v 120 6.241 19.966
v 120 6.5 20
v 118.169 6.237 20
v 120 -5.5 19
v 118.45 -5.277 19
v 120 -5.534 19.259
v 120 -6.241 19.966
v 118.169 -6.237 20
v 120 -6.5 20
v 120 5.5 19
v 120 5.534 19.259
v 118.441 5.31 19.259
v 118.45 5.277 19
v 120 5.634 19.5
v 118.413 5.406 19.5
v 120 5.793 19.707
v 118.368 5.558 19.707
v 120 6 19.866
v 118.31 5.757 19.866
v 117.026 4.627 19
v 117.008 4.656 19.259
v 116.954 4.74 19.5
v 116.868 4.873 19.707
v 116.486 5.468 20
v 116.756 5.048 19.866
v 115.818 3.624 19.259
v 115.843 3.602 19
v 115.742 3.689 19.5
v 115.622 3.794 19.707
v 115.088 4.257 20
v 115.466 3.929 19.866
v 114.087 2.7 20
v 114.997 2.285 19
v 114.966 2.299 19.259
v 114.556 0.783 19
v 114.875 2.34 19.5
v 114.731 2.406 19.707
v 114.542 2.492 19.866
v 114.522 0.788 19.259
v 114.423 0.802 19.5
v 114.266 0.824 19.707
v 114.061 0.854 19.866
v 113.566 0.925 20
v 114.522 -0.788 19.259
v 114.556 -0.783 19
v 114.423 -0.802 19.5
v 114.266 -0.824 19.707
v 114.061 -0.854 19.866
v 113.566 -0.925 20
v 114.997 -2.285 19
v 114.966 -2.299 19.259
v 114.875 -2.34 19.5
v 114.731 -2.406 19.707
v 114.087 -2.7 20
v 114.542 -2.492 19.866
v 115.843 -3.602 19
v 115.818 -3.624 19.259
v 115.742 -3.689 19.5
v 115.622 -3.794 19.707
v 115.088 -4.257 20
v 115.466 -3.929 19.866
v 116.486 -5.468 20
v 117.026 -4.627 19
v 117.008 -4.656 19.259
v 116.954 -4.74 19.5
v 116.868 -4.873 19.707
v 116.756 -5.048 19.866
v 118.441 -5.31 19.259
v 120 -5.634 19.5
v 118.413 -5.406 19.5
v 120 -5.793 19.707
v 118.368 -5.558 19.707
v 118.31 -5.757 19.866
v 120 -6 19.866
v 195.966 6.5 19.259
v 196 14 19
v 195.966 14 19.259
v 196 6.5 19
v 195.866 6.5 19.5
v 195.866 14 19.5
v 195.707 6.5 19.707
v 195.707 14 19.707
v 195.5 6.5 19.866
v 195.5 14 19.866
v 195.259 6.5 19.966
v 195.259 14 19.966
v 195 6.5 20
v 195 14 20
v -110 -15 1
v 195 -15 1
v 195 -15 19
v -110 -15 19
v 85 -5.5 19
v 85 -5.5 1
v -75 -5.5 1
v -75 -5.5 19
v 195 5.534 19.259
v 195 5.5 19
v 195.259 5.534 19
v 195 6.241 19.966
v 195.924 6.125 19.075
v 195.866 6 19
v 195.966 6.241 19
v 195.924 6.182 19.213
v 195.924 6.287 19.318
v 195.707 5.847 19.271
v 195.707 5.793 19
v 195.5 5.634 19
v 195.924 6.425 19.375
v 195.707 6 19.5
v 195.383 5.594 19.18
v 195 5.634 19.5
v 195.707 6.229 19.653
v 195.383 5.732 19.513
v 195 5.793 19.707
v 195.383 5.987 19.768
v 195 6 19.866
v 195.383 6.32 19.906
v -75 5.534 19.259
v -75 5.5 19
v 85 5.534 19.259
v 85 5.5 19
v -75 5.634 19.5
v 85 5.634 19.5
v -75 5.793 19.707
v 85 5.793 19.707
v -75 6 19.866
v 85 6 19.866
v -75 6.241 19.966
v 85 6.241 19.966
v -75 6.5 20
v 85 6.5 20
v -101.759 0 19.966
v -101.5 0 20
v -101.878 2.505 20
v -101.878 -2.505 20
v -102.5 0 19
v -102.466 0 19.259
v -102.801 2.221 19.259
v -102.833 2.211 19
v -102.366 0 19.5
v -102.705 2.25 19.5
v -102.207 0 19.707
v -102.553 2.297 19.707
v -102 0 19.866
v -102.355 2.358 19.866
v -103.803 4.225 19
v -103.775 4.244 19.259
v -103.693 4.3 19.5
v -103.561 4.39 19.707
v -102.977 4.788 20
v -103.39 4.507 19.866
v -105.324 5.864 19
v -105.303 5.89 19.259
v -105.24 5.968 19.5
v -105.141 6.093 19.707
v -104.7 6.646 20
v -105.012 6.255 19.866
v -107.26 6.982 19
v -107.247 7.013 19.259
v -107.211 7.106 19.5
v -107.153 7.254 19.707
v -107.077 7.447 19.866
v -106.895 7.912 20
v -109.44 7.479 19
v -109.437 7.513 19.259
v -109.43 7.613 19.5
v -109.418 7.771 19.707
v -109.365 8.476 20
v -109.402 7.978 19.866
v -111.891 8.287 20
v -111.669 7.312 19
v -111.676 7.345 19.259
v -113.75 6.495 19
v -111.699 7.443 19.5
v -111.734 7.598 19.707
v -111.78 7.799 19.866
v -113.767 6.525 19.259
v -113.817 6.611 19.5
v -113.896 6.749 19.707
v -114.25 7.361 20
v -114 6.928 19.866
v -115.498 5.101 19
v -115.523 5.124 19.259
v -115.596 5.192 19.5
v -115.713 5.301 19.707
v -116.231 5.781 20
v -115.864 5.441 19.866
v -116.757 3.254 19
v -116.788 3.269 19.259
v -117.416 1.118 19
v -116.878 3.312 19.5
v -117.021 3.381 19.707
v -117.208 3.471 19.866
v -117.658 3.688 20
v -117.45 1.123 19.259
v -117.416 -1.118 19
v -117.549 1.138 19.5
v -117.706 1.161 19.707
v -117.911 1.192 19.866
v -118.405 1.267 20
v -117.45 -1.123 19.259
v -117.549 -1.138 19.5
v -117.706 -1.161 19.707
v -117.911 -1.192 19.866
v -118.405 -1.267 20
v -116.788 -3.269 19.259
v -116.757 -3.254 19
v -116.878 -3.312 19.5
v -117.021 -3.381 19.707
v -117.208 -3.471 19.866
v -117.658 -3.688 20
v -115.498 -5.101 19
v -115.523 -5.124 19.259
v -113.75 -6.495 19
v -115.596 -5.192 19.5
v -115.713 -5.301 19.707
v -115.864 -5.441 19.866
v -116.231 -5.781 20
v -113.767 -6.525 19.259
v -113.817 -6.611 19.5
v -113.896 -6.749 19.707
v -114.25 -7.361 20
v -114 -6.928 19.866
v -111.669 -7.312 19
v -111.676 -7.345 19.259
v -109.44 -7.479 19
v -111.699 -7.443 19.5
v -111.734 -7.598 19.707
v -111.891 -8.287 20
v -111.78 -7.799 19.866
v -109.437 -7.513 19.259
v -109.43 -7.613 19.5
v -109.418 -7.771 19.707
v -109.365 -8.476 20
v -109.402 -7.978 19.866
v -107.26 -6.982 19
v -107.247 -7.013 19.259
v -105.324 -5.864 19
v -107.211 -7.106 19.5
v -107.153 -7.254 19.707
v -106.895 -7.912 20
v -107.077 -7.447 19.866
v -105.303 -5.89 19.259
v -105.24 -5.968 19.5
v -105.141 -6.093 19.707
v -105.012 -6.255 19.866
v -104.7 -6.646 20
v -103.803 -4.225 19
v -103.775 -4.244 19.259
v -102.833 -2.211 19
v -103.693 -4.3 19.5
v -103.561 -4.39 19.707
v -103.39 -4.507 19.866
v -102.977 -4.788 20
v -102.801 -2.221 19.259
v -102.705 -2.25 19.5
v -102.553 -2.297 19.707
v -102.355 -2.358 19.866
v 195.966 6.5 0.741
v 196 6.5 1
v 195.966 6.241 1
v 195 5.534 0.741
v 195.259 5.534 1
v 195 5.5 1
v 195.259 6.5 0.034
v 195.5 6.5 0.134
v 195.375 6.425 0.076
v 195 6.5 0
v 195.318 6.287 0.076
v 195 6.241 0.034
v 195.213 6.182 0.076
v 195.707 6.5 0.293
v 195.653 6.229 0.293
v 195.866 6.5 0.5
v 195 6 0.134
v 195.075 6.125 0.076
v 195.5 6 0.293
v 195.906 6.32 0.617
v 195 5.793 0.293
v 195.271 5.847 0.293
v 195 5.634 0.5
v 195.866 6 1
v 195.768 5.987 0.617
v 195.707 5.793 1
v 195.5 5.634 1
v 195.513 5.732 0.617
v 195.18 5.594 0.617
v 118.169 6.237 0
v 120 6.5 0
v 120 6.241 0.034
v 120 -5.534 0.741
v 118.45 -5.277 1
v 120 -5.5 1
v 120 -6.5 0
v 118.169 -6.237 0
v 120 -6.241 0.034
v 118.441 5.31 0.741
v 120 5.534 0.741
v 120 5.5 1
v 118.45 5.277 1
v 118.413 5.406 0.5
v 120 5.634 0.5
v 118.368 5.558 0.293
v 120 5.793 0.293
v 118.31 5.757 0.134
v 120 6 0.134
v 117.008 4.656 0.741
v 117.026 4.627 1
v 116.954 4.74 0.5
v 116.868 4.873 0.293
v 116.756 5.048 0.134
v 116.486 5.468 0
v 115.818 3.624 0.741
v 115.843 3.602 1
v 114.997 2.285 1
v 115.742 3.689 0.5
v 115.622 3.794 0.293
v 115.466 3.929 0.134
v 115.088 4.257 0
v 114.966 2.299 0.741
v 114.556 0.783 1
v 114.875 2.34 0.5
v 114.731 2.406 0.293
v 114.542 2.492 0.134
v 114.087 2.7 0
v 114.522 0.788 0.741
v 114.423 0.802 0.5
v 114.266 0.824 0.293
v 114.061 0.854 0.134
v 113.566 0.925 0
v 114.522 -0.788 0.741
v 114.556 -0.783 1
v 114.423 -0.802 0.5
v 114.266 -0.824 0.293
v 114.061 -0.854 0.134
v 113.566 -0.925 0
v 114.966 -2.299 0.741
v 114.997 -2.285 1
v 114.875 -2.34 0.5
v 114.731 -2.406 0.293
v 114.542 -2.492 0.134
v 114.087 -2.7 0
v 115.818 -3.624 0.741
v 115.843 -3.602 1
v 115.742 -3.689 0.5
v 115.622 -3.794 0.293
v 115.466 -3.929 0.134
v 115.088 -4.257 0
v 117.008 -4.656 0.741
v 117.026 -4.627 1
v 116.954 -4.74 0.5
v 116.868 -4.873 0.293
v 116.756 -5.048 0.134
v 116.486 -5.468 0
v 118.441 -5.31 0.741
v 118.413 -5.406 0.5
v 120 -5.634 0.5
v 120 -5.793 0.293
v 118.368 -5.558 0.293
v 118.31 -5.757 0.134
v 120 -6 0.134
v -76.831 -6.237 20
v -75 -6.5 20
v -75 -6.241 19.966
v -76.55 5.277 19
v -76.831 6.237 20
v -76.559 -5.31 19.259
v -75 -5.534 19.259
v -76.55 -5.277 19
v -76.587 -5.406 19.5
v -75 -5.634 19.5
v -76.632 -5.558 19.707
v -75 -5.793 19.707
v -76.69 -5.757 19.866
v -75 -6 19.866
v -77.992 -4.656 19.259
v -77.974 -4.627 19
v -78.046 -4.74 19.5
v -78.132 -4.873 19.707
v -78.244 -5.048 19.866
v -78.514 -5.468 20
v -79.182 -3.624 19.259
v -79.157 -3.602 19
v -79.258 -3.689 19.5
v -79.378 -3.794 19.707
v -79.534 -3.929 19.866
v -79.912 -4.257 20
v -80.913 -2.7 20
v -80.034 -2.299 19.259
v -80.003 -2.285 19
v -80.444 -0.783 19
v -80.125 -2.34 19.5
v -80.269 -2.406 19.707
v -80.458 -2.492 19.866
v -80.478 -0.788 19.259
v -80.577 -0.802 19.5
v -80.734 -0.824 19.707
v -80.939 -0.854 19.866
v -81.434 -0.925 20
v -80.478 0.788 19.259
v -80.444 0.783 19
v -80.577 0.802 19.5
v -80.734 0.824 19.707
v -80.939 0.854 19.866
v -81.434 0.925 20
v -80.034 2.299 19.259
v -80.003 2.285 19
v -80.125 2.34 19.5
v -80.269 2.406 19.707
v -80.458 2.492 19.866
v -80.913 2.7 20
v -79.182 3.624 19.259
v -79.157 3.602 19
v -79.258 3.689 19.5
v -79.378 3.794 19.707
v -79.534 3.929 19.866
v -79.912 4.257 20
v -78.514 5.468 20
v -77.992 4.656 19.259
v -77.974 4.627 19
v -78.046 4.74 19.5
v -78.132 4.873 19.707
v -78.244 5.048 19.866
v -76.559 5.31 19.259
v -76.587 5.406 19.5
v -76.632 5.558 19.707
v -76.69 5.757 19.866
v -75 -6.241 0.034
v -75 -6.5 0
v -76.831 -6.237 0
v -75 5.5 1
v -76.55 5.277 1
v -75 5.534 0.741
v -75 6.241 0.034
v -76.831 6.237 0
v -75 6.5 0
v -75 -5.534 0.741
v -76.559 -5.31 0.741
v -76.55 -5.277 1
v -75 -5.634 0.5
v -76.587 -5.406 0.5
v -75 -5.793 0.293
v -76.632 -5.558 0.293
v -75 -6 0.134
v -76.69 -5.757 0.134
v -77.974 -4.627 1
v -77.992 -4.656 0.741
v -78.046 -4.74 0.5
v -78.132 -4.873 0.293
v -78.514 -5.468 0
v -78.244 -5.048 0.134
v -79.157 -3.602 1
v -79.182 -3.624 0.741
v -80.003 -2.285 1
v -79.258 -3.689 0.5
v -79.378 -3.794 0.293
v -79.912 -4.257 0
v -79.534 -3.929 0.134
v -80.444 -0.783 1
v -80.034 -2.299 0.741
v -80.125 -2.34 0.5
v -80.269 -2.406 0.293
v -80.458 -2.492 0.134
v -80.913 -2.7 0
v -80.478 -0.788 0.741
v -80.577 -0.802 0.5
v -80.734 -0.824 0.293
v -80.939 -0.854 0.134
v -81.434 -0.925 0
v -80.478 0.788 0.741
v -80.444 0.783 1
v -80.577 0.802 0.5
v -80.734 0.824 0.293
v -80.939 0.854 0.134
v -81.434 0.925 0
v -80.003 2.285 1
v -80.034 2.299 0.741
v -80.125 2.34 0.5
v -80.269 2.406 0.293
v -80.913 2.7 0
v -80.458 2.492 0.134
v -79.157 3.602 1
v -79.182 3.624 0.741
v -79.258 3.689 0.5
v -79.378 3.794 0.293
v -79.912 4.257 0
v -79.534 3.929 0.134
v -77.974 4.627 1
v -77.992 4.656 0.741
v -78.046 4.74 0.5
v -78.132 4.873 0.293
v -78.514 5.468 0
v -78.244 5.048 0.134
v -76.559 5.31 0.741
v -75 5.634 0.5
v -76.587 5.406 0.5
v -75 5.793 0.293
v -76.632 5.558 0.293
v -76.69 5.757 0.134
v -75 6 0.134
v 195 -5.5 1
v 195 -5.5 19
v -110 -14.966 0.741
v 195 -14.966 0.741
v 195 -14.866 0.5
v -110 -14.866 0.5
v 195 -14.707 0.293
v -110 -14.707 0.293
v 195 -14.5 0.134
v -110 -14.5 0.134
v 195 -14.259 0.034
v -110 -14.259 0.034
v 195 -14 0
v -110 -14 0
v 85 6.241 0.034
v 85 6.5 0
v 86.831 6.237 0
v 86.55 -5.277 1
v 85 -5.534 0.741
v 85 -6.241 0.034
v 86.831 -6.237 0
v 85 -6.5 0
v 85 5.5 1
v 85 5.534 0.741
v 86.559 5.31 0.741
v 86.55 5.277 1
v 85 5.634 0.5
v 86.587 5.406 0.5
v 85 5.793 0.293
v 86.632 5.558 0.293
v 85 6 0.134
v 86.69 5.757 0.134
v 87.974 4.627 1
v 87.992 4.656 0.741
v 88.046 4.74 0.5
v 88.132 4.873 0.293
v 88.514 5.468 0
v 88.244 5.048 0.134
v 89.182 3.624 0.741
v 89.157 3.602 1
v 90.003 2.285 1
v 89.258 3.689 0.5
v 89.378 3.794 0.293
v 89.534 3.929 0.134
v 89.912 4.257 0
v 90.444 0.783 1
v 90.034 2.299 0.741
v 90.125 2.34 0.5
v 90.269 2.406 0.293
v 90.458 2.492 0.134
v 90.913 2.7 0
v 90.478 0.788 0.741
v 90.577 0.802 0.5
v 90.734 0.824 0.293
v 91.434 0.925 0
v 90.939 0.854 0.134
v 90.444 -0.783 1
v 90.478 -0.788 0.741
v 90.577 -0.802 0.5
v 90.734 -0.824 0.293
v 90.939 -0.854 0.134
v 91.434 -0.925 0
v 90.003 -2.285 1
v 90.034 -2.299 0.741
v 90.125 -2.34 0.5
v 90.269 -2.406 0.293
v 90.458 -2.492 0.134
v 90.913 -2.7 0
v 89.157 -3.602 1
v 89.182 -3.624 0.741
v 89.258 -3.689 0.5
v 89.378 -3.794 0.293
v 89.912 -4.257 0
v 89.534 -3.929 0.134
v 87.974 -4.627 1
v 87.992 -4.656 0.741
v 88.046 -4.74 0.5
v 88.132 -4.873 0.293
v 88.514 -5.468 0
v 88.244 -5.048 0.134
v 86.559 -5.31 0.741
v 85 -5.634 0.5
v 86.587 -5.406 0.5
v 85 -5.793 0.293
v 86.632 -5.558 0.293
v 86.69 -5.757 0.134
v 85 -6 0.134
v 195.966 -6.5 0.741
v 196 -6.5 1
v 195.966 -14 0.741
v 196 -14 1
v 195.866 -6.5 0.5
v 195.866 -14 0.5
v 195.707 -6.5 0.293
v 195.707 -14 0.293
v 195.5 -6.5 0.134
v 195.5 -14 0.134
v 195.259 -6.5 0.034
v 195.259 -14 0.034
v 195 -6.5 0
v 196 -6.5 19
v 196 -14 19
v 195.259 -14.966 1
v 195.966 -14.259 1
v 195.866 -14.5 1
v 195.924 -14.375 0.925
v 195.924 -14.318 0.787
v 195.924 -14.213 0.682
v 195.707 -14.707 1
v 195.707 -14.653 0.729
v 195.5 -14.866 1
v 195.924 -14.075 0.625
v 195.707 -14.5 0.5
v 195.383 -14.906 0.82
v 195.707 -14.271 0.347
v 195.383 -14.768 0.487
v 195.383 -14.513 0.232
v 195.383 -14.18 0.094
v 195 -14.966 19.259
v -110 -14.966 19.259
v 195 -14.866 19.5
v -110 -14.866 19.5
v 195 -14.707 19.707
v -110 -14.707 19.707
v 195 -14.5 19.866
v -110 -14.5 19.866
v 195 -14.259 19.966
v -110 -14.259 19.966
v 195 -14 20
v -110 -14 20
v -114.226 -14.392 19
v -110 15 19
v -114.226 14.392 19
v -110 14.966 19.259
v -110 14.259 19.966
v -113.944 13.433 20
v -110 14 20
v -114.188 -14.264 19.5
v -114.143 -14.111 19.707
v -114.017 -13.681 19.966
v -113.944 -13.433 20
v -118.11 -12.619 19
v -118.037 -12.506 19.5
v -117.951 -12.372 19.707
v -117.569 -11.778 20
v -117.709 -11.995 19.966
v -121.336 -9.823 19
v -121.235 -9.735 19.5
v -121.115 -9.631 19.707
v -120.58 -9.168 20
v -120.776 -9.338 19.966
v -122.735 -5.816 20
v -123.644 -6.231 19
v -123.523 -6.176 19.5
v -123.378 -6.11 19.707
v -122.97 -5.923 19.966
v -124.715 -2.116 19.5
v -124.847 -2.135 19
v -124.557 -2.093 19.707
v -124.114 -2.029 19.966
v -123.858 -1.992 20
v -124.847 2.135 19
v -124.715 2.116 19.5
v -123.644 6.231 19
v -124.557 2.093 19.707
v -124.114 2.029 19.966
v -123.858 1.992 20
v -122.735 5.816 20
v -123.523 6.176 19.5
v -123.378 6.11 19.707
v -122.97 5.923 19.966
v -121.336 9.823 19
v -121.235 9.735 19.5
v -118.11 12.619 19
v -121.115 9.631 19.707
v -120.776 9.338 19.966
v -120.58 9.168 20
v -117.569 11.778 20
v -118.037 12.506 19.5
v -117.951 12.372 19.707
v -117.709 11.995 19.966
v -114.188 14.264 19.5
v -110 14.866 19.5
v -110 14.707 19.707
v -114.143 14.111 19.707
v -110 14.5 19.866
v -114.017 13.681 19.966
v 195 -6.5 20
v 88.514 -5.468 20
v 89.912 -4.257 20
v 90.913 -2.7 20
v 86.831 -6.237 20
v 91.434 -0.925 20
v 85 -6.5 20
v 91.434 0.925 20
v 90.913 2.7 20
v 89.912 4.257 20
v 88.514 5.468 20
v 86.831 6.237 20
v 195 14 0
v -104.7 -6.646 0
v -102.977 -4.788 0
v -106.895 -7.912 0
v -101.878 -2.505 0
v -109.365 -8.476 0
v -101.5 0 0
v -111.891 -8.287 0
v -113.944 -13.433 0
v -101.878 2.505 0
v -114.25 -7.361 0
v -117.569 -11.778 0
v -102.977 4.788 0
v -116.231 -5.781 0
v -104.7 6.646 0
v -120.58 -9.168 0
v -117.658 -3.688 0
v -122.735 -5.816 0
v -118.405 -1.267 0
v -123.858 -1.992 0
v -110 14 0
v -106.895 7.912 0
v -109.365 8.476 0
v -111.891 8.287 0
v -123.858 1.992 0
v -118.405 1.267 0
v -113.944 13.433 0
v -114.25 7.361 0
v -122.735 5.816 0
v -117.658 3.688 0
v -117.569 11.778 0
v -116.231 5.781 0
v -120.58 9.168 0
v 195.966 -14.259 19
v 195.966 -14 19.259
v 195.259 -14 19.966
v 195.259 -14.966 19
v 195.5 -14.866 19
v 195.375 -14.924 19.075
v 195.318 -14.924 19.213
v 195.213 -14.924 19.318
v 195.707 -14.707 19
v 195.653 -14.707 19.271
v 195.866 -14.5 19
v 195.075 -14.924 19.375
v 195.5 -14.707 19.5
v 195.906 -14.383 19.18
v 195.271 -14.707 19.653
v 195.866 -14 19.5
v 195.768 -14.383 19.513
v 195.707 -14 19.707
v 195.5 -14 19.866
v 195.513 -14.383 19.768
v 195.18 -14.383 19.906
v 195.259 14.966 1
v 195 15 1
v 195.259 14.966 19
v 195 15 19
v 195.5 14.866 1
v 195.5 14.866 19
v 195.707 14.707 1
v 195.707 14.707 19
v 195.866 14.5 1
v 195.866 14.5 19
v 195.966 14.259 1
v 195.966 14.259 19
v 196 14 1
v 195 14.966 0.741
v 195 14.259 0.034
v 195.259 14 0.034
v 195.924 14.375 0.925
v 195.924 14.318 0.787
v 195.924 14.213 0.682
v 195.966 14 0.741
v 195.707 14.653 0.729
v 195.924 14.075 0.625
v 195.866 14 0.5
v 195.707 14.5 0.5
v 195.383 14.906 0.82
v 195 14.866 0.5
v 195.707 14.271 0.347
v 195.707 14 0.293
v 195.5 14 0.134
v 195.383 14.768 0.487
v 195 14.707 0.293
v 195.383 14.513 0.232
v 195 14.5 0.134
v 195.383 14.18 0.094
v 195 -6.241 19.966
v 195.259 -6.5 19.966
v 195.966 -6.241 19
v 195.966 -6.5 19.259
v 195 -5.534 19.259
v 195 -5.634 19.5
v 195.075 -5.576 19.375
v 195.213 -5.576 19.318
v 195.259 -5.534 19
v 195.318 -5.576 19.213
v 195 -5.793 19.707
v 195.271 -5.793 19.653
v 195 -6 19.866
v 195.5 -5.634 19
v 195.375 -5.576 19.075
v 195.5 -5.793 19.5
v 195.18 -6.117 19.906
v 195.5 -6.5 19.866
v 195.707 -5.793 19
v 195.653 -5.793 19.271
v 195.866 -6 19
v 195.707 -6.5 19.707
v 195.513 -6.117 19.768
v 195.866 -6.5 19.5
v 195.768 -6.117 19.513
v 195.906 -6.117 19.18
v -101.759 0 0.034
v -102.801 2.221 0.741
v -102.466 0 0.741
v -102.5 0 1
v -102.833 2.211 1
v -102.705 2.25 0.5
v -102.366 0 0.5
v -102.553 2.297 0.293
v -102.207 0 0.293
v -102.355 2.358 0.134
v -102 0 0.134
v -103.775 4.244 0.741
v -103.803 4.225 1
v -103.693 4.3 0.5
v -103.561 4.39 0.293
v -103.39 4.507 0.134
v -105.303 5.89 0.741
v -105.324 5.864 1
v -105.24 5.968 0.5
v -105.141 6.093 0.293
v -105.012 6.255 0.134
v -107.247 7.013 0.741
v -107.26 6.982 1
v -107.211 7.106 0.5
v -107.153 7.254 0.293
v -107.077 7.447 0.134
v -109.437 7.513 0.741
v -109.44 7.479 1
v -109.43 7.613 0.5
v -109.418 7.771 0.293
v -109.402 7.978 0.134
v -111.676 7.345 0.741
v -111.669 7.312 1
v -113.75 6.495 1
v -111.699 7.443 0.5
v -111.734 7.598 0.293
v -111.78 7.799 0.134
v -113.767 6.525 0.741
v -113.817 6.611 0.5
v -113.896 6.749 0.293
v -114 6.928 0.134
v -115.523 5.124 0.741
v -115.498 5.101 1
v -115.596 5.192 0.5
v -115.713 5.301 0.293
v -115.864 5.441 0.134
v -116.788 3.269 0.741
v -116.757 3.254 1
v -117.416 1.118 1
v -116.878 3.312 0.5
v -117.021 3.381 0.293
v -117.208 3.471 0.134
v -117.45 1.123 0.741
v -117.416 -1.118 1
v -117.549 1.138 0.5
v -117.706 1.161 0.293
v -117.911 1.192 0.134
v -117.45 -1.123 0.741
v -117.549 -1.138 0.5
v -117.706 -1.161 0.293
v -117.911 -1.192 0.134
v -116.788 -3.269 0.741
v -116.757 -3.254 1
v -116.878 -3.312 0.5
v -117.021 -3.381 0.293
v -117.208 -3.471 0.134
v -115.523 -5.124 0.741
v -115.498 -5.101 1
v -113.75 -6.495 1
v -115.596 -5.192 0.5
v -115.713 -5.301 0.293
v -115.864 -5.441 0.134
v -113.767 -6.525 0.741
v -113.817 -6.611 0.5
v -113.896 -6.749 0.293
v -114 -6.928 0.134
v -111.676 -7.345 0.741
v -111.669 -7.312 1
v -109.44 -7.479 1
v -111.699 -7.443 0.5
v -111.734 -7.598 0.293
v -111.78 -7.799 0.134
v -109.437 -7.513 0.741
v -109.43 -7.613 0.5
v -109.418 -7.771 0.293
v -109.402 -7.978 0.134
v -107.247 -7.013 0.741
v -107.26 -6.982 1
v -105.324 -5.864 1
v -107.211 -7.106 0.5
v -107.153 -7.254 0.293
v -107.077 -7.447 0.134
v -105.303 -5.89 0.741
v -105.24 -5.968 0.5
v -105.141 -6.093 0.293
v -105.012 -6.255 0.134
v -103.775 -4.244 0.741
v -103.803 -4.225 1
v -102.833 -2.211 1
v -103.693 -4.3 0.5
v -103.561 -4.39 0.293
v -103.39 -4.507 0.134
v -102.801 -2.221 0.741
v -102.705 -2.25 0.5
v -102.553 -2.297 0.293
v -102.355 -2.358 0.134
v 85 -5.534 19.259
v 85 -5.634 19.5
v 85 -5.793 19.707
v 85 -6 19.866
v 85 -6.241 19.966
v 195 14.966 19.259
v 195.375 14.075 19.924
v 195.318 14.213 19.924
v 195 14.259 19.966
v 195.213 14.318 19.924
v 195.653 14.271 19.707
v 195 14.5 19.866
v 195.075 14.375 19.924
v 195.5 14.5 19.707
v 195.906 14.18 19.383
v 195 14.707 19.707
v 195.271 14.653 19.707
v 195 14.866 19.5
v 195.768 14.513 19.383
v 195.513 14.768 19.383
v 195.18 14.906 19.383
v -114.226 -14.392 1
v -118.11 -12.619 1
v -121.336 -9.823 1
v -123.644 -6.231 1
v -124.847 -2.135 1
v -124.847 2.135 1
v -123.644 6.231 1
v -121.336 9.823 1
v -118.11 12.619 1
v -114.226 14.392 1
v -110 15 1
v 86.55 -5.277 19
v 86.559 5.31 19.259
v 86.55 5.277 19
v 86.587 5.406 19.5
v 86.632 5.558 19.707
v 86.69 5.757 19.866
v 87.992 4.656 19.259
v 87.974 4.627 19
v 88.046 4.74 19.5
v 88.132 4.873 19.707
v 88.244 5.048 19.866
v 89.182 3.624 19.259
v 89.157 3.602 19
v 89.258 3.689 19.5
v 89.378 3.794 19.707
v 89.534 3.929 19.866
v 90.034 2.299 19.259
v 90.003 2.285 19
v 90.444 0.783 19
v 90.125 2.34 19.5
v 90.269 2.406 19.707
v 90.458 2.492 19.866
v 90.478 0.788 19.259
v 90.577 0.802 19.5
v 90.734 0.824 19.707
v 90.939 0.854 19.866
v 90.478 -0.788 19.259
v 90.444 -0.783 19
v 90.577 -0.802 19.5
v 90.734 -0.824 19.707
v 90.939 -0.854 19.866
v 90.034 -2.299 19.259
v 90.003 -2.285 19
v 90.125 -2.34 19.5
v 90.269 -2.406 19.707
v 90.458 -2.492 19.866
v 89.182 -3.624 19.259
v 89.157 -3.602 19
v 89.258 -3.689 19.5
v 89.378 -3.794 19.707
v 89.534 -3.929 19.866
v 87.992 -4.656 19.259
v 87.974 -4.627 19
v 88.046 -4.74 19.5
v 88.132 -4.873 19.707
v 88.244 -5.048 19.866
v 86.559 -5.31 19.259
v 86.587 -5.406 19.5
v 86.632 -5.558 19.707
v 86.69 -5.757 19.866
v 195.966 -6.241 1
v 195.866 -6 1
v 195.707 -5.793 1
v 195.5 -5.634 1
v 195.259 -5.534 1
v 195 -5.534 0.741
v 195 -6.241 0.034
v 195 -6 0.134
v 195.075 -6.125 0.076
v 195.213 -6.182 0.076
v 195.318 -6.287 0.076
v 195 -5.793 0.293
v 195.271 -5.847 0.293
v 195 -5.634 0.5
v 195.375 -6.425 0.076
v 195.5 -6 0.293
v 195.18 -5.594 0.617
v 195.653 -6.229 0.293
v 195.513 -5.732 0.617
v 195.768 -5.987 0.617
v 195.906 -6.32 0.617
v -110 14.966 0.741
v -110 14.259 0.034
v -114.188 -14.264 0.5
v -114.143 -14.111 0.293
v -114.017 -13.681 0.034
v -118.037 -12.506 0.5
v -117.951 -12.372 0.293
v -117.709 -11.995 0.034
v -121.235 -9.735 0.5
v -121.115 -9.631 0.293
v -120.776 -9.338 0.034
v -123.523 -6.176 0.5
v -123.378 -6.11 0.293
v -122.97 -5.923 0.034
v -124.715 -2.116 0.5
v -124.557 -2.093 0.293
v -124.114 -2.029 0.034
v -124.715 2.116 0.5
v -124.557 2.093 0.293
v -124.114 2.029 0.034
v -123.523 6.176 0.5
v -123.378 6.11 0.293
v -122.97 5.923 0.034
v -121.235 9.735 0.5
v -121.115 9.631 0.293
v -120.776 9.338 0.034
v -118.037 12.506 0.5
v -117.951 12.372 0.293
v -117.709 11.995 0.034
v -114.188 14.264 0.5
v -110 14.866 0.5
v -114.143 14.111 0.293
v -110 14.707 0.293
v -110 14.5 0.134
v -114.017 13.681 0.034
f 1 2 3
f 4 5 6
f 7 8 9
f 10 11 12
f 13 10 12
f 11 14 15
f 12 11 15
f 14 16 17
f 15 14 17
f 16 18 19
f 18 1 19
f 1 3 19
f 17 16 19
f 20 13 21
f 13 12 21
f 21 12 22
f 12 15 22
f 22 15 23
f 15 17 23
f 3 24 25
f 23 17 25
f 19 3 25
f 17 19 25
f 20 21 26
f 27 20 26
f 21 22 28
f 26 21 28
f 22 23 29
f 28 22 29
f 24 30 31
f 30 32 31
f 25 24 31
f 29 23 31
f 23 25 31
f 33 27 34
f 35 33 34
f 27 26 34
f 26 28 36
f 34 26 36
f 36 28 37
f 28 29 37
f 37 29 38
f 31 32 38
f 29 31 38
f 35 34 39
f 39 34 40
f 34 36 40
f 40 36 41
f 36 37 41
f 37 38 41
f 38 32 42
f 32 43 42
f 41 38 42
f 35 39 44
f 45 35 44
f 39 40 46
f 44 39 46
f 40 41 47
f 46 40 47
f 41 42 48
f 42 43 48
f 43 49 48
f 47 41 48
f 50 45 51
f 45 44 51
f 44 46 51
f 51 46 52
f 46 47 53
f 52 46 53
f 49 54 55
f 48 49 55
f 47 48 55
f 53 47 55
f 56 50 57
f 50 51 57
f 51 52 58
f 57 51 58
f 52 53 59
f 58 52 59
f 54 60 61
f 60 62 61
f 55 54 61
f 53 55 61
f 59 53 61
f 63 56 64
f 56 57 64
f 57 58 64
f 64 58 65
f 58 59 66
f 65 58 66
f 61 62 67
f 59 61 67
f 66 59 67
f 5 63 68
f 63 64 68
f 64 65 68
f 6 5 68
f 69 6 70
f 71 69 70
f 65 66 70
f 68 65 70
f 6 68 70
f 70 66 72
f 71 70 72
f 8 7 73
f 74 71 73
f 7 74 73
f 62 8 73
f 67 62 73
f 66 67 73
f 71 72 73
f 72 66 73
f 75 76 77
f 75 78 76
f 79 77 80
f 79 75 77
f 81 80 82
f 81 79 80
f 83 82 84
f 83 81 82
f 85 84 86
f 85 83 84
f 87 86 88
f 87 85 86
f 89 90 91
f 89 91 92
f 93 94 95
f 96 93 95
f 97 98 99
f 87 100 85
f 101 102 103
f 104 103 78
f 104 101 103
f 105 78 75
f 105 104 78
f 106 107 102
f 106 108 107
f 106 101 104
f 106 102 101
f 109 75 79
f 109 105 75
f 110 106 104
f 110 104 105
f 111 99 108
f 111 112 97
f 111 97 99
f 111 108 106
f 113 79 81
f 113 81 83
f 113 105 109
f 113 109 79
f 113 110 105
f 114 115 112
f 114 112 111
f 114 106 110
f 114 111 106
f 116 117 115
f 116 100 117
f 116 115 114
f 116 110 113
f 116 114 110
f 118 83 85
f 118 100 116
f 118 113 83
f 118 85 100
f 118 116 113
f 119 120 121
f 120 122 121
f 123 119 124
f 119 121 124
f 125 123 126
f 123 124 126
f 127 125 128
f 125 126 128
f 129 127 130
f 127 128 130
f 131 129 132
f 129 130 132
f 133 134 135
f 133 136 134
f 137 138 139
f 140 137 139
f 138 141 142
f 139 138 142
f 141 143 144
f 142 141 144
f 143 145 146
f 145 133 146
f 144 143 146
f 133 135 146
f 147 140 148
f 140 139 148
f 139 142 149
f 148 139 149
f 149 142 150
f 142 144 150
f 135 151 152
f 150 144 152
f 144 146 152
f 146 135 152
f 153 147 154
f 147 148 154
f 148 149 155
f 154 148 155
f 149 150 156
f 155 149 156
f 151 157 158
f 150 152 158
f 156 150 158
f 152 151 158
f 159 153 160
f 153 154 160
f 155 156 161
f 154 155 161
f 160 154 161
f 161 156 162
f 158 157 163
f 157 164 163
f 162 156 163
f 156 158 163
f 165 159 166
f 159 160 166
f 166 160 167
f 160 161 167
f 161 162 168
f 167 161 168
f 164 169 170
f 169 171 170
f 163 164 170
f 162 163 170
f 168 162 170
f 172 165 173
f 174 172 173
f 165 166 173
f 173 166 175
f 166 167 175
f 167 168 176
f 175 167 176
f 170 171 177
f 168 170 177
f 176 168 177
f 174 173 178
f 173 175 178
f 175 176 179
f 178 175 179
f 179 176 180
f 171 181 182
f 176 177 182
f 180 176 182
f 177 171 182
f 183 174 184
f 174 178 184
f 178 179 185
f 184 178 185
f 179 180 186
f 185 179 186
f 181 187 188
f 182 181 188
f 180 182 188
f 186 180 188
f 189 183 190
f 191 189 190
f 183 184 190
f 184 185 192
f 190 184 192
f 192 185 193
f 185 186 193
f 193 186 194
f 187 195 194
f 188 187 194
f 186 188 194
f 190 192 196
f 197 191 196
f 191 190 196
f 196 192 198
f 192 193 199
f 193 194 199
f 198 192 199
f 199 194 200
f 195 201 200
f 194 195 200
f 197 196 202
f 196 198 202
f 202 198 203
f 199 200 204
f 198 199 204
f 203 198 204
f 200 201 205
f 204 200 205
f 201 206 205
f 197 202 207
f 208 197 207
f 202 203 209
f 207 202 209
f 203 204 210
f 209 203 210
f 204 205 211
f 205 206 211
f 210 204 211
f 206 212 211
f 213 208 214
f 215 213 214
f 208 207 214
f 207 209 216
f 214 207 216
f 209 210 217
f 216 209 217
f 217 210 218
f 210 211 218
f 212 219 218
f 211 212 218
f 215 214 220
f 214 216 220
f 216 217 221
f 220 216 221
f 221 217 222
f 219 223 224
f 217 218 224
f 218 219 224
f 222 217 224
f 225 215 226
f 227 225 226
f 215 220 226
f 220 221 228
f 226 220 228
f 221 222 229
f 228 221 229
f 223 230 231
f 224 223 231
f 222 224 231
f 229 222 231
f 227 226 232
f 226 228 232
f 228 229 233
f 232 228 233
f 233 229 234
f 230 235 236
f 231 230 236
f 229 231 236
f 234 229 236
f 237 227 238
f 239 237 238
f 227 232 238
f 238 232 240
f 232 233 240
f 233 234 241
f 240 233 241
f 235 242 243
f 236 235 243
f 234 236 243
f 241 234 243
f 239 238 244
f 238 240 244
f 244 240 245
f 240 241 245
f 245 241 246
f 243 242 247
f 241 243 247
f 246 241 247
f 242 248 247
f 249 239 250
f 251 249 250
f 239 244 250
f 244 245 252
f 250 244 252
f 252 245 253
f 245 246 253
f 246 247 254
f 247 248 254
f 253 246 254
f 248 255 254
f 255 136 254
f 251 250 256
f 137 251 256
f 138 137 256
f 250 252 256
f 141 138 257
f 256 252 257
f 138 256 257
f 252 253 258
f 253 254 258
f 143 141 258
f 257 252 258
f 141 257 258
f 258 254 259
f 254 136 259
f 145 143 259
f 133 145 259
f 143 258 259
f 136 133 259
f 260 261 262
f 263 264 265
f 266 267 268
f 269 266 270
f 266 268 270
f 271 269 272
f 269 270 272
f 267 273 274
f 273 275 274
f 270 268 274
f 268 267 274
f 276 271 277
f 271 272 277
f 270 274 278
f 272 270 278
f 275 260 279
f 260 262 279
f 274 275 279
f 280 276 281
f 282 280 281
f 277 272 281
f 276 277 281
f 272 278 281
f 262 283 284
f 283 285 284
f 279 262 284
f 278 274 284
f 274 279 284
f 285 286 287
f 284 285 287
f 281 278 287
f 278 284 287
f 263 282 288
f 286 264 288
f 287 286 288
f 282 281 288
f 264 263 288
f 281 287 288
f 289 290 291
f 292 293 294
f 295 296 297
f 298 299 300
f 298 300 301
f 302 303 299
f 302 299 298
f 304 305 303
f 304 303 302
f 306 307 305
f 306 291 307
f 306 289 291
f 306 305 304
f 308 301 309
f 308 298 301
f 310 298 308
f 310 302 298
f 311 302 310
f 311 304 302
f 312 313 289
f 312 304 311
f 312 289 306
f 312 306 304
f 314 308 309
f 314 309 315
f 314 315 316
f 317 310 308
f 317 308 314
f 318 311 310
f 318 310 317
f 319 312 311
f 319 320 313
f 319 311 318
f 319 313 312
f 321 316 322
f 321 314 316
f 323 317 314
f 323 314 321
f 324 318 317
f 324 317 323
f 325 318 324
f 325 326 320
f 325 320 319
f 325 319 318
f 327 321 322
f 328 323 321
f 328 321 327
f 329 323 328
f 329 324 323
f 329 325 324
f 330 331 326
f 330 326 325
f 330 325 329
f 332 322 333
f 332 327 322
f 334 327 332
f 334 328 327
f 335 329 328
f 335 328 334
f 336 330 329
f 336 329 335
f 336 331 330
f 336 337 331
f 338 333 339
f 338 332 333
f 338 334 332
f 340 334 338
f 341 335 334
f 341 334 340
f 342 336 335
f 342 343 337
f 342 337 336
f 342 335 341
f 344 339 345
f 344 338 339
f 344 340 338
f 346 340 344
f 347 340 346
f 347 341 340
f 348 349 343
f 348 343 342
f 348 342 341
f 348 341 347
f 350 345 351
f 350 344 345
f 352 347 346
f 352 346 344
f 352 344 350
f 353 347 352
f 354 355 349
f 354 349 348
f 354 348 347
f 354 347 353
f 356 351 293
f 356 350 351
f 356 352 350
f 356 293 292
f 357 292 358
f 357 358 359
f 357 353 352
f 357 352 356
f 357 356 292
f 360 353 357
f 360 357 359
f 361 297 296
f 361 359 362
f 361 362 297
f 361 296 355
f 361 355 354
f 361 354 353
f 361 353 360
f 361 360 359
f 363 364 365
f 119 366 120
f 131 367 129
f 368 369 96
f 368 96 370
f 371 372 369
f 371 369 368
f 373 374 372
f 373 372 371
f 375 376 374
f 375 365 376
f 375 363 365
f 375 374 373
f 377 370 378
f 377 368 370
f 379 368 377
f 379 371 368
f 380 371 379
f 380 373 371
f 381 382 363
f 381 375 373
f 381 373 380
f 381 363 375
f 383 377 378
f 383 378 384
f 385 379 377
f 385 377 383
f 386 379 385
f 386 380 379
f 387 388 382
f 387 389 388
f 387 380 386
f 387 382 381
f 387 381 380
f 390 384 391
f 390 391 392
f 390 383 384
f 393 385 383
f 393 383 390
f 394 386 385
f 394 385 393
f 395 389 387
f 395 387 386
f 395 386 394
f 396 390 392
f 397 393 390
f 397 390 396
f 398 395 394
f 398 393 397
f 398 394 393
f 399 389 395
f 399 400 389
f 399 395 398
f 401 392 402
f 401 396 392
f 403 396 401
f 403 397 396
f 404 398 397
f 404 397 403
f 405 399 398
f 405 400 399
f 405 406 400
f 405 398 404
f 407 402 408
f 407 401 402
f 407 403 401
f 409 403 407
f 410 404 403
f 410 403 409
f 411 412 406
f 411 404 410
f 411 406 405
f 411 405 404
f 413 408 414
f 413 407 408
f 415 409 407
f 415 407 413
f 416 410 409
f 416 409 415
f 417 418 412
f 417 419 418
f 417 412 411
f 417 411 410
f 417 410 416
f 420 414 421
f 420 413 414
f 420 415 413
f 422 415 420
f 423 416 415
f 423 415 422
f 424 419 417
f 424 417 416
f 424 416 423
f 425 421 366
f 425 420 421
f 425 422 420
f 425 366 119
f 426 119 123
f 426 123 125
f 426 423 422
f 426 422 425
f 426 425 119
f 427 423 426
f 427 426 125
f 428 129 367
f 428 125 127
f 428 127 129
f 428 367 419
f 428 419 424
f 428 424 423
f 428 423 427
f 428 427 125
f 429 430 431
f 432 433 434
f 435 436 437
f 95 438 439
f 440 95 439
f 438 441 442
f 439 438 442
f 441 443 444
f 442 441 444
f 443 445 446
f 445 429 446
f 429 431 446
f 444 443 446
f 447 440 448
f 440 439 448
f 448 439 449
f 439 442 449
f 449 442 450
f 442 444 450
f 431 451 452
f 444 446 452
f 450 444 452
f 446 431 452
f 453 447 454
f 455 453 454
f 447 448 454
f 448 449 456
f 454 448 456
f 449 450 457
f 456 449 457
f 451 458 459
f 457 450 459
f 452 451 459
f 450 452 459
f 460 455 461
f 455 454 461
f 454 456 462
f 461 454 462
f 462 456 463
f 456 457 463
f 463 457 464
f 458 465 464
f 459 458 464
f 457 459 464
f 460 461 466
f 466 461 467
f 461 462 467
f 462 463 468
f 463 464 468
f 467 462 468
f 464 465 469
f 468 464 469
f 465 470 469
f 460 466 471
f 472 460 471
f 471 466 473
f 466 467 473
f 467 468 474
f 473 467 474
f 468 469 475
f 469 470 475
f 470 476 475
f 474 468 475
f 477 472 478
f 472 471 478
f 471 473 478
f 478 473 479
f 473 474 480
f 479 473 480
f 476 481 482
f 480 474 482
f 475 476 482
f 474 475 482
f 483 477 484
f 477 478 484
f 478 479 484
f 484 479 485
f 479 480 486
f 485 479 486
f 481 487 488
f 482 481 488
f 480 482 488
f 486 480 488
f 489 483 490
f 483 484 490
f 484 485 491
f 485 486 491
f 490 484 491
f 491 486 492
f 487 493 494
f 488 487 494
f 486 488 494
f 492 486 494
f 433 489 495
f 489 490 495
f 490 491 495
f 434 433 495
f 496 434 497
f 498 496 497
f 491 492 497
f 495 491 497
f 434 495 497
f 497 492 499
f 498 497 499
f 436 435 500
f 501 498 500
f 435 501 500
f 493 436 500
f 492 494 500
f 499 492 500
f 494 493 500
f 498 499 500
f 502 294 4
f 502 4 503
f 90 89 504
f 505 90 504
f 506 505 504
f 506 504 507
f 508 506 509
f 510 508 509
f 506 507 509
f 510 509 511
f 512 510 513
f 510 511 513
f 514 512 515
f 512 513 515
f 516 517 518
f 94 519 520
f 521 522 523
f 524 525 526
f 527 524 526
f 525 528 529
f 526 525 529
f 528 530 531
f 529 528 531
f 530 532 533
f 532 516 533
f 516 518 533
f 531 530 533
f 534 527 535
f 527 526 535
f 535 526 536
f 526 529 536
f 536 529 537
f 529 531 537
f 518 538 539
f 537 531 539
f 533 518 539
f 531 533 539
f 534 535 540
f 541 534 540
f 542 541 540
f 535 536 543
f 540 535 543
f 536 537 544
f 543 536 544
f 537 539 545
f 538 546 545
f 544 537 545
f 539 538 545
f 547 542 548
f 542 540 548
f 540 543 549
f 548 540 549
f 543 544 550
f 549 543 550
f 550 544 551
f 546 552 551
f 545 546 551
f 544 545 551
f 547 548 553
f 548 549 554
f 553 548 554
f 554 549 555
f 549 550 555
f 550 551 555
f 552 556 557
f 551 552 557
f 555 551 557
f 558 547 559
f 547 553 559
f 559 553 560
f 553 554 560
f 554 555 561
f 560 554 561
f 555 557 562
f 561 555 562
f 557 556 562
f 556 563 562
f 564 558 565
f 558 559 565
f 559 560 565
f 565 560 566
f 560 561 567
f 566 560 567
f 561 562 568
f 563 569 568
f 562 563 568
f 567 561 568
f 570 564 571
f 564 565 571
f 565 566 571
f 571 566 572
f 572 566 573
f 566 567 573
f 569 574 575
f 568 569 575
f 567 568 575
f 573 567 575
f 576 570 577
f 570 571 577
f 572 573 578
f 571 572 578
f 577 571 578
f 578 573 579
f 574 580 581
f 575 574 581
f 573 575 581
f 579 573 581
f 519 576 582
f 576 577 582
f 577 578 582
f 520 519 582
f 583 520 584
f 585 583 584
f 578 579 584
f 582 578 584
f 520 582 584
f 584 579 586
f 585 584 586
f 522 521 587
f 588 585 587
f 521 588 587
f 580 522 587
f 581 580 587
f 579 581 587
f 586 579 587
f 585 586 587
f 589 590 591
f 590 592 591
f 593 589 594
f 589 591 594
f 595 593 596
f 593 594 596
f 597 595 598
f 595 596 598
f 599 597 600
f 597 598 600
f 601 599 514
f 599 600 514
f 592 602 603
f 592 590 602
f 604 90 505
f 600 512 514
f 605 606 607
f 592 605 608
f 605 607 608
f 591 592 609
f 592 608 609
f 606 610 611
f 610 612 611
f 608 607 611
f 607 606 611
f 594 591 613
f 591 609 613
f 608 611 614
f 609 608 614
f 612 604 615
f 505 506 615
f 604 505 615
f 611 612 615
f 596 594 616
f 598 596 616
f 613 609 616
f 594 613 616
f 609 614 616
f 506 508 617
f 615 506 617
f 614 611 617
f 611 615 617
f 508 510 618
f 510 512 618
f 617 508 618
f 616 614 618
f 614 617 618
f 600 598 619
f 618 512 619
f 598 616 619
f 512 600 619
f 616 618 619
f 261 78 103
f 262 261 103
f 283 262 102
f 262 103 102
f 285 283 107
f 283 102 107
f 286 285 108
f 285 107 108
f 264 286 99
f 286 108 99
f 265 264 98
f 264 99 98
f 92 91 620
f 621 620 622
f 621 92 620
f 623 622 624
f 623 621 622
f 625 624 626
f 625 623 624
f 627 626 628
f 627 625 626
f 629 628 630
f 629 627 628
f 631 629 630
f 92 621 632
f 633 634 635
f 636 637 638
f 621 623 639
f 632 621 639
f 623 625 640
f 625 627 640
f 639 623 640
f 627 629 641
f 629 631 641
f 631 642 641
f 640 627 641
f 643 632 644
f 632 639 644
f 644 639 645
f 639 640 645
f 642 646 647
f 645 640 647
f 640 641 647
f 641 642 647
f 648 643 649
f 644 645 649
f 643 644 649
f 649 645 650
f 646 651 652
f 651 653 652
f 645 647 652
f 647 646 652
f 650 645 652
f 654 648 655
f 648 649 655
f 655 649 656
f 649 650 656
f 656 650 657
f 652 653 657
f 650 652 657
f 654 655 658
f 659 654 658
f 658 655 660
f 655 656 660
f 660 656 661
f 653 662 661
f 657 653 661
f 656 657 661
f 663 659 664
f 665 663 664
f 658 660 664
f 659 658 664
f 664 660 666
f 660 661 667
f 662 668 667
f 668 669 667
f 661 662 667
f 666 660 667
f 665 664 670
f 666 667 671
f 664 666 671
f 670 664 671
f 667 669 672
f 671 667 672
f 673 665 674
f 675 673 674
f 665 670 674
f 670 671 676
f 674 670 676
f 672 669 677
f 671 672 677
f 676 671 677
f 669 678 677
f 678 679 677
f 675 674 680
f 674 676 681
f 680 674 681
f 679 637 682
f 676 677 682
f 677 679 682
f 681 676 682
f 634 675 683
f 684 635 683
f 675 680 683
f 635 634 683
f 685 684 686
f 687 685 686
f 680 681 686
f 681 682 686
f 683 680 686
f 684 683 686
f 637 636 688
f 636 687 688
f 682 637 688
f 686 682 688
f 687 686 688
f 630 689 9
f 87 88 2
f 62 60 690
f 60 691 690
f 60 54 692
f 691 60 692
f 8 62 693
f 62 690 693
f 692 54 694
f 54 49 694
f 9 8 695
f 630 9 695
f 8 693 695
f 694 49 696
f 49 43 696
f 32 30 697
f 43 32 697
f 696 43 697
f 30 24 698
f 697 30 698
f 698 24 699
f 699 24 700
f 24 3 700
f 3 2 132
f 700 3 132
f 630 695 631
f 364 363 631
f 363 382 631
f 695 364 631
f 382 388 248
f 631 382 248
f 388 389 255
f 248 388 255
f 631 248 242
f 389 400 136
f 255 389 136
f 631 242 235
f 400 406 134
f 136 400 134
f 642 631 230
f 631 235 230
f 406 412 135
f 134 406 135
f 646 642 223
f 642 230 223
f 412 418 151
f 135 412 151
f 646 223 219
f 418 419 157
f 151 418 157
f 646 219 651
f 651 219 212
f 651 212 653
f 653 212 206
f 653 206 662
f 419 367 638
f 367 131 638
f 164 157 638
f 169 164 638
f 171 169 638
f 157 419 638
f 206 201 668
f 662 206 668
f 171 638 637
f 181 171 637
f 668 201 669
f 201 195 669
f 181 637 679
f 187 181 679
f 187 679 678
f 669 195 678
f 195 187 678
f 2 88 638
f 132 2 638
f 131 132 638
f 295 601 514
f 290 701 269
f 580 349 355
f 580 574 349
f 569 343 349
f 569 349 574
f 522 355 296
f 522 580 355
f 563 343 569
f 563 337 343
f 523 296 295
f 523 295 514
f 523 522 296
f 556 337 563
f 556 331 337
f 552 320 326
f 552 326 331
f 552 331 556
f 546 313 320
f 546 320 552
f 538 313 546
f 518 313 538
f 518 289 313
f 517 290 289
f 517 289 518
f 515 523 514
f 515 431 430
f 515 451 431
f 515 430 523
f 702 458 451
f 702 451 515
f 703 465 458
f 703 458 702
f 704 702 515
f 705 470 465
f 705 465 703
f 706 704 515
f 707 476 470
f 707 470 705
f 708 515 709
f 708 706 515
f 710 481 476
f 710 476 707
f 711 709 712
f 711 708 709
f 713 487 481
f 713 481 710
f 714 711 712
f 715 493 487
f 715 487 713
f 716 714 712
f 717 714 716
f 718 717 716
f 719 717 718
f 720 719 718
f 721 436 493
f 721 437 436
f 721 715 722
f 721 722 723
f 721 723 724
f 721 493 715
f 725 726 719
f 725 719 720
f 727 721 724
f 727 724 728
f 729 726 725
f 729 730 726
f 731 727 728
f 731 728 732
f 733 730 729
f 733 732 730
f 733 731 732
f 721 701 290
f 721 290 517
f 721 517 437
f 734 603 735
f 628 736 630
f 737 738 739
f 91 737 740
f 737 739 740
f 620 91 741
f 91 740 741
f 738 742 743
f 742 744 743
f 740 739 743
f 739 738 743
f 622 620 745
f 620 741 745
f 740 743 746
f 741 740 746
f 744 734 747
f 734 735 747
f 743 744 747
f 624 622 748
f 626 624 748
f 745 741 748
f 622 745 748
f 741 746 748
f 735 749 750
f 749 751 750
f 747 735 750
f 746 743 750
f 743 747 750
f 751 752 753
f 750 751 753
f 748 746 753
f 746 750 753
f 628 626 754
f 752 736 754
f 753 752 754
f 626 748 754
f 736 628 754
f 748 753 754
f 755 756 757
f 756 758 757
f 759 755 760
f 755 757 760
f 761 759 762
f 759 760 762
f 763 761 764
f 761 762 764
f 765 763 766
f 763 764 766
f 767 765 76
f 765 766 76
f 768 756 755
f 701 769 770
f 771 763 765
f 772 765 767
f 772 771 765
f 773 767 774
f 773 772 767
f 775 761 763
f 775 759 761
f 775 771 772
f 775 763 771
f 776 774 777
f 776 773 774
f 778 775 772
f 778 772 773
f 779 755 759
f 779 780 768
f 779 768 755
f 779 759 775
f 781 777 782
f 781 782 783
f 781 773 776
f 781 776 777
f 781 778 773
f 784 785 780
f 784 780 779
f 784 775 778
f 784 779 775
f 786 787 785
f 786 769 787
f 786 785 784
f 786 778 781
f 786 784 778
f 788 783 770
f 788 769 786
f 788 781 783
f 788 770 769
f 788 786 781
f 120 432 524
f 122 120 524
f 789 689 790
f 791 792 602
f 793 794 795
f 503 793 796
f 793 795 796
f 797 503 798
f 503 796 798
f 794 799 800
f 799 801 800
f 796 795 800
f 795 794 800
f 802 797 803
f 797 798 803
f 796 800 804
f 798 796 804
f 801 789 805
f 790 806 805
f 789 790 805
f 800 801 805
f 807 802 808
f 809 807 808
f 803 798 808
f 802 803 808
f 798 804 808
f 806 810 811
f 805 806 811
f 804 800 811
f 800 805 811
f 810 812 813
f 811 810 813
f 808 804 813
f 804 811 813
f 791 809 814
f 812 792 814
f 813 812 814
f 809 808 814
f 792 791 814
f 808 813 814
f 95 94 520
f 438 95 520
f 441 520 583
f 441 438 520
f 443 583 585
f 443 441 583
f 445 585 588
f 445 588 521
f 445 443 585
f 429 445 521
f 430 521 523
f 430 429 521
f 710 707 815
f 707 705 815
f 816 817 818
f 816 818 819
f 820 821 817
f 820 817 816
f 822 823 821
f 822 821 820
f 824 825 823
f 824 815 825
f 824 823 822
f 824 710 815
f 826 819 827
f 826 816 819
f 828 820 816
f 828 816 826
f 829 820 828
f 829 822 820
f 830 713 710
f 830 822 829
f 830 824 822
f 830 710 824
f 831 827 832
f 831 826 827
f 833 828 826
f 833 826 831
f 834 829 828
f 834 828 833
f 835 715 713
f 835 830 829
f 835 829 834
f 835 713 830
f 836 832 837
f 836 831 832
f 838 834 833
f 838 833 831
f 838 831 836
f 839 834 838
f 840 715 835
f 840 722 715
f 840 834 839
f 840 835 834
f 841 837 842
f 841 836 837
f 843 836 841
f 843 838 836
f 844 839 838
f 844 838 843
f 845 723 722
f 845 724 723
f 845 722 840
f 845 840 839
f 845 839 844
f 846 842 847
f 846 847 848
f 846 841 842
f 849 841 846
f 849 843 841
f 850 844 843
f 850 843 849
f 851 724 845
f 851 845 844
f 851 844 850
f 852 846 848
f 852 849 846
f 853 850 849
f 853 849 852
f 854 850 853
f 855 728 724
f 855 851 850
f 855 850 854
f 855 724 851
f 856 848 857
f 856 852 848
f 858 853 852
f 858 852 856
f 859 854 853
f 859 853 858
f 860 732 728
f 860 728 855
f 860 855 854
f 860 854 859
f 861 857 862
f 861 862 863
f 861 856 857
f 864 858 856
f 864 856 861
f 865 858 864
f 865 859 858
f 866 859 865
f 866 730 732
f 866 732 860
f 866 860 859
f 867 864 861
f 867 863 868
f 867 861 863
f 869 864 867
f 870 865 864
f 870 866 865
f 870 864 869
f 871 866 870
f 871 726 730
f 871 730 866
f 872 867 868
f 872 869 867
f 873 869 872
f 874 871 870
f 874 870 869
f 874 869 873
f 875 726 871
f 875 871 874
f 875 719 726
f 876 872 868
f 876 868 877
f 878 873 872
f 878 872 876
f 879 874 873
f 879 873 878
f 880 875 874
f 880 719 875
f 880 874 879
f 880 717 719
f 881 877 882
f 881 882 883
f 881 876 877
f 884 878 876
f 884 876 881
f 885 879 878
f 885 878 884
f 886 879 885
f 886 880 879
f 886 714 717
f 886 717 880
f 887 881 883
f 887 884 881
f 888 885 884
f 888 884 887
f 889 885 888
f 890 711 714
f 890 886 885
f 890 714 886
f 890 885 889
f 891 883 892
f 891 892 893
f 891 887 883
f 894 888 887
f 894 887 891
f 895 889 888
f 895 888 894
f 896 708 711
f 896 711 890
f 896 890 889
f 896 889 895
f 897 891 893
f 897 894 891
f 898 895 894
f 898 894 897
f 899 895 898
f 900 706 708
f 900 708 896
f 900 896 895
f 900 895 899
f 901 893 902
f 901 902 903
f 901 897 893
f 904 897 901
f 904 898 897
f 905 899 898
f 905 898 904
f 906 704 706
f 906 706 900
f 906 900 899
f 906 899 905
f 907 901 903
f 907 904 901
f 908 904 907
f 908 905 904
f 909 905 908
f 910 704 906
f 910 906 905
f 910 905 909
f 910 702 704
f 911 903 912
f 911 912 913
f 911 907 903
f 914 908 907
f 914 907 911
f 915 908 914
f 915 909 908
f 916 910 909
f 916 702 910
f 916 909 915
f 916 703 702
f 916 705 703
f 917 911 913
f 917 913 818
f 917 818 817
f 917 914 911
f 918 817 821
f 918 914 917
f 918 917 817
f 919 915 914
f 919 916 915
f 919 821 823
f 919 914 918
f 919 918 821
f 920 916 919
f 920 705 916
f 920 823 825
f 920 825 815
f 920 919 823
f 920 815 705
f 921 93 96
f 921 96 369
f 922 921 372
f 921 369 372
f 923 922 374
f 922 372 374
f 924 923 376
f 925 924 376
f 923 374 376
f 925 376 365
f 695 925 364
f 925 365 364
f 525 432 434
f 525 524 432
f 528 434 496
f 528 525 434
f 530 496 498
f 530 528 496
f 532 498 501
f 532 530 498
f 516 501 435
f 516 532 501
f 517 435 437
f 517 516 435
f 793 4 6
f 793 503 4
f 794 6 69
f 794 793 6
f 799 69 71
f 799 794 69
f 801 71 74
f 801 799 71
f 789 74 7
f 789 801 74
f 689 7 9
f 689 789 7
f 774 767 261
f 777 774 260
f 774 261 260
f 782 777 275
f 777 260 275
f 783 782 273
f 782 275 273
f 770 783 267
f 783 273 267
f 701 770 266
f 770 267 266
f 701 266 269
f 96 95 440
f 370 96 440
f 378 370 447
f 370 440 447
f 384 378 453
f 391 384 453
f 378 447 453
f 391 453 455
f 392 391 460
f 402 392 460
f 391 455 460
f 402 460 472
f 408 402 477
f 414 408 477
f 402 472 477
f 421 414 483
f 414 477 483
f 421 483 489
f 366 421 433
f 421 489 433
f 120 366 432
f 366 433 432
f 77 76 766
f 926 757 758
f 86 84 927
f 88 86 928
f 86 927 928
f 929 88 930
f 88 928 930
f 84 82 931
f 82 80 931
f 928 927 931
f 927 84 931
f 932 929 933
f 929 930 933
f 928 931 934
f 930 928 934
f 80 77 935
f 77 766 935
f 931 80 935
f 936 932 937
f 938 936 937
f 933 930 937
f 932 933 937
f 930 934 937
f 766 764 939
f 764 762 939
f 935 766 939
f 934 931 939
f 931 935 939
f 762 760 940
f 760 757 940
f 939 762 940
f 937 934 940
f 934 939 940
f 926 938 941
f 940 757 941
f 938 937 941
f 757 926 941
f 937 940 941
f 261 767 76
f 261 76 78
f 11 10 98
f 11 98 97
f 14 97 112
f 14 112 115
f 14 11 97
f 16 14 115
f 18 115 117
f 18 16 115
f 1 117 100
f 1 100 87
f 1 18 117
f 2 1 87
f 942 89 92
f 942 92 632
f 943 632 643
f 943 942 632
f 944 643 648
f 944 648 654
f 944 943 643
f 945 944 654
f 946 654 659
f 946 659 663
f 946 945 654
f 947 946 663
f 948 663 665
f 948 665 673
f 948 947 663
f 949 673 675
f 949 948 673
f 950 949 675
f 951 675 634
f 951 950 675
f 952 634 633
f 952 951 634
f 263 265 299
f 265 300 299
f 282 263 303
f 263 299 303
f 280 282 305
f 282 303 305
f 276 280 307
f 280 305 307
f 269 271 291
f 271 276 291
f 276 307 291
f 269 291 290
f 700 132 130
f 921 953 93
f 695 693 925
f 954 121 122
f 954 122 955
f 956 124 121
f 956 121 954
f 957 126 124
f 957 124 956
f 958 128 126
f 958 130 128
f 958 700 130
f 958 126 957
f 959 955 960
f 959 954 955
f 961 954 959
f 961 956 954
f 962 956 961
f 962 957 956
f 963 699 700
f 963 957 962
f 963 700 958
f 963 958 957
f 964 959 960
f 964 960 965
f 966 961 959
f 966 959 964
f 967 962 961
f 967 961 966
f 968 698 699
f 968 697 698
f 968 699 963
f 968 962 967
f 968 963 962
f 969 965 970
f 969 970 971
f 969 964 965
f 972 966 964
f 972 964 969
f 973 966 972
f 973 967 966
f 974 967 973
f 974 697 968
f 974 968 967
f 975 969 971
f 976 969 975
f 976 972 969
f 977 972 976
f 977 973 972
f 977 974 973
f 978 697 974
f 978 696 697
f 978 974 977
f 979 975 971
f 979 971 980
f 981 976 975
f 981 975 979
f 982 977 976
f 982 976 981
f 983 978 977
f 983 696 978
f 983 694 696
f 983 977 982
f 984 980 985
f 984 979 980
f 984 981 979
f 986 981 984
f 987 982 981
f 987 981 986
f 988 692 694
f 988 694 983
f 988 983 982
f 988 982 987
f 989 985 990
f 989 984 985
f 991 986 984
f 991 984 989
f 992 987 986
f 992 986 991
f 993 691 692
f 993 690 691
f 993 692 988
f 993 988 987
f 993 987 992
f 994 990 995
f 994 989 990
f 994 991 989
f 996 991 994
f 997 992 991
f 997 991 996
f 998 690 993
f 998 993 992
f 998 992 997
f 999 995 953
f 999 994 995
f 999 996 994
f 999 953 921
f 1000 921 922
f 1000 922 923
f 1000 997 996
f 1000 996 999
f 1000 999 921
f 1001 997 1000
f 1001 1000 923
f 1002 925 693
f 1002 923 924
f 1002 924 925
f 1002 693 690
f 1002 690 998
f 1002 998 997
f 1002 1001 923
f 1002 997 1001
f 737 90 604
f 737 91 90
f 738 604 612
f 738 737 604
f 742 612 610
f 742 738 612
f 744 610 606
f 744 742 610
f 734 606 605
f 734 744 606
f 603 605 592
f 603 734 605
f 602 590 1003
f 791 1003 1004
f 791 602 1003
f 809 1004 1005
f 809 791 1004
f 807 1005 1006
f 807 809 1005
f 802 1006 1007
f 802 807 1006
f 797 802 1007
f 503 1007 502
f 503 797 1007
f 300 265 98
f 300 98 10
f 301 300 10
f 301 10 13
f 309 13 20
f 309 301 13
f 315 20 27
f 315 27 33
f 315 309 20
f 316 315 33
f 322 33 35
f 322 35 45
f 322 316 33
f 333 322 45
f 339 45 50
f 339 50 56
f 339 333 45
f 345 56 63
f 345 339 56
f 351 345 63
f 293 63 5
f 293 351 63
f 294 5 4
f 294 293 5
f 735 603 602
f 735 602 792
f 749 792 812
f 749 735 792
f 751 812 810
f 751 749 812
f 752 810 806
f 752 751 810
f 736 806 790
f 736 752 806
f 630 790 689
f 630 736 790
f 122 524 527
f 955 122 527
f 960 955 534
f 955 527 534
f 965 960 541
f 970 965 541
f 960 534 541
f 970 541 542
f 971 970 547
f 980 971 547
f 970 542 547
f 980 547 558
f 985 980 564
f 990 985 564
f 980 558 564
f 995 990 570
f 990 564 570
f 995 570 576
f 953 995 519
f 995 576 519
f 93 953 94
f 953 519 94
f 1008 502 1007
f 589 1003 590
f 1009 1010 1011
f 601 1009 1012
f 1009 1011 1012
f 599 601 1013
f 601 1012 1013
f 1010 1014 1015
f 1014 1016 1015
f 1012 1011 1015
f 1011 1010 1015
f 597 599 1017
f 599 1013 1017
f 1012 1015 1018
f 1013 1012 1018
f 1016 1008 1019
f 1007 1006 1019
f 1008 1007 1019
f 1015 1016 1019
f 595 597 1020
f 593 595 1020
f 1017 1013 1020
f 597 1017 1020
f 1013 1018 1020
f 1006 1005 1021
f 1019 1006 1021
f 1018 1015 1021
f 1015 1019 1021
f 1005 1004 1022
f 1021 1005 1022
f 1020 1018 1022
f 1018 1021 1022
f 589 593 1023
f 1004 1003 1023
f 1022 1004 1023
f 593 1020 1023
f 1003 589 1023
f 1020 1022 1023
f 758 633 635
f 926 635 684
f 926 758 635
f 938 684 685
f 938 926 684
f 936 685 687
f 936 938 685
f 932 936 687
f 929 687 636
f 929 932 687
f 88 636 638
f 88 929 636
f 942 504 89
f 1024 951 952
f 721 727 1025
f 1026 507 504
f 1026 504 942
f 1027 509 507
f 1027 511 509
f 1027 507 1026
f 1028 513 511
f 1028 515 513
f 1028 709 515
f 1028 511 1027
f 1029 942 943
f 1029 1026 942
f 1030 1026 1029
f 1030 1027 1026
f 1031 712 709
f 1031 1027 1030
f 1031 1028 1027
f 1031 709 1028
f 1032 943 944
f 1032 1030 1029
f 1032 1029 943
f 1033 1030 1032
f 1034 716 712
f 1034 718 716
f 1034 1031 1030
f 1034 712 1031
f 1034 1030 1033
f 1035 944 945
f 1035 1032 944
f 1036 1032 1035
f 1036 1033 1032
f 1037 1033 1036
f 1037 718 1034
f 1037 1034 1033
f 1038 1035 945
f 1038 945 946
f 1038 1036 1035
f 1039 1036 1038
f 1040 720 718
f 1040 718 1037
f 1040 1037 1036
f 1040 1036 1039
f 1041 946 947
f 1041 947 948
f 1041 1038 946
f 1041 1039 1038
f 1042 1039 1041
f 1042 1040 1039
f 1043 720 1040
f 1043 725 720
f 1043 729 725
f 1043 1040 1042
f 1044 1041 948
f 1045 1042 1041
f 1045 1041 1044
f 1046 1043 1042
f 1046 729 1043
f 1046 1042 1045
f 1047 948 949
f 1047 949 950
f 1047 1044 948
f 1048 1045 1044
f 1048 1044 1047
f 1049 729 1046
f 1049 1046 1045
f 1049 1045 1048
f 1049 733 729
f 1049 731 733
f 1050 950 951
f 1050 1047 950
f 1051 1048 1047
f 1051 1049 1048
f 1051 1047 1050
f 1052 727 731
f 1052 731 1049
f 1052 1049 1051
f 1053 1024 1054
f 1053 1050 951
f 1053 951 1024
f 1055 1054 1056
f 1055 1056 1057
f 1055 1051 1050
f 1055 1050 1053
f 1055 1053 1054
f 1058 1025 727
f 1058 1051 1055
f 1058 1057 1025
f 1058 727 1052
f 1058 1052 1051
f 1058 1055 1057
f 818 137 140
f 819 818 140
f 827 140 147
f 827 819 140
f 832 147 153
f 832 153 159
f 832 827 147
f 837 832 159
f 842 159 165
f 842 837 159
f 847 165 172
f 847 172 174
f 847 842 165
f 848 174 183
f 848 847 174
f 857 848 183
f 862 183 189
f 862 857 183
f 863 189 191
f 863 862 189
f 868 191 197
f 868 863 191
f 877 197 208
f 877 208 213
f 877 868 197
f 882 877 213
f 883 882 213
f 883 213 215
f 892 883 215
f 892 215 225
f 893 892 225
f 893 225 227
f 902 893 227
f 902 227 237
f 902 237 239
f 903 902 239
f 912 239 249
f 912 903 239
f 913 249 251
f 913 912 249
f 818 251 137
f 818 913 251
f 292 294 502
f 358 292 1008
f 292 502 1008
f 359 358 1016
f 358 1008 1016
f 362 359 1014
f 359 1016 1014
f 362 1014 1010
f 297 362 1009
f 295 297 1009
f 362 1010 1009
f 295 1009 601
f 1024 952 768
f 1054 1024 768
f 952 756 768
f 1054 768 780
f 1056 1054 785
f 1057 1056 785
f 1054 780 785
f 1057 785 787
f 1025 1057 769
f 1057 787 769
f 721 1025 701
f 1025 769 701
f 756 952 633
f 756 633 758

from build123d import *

# Parameters (mm, degrees)
SKETCH1_R           = 7.5
BOSS_EXTRUDE1_DEPTH = 20
FILLET1_R           = 1


with BuildPart() as part:
    # Sketch1 → Boss-Extrude1 (new body)
    with BuildSketch(Plane.XY):
        with BuildLine():
            Line((-110, 15), (196, 15))
            Line((196, 15), (196, 5.5))
            Line((196, 5.5), (120, 5.5))
            ThreePointArc((120, 5.5), (114.5, 0), (120, -5.5))
            Line((120, -5.5), (196, -5.5))
            Line((196, -5.5), (196, -15))
            Line((196, -15), (-110, -15))
            ThreePointArc((-110, -15), (-125, 0), (-110, 15))
        make_face()
        with Locations((-110, 0)):
            Circle(SKETCH1_R, mode=Mode.SUBTRACT)
        with BuildLine():
            Line((-75, 5.5), (85, 5.5))
            ThreePointArc((85, 5.5), (90.5, 0), (85, -5.5))
            Line((85, -5.5), (-75, -5.5))
            ThreePointArc((-75, -5.5), (-80.5, 0), (-75, 5.5))
        make_face(mode=Mode.SUBTRACT)
    extrude(amount=BOSS_EXTRUDE1_DEPTH)

    # Fillet1
    fillet1_edges = [part.edges().sort_by_distance(p)[0] for p in [
        (196, -10.25, 20),
        (43, -15, 0),
        (-125, 0, 0),
        (158, -5.5, 20),
        (196, 15, 10),
        (196, 5.5, 10),
        (196, -5.5, 10),
        (196, -15, 10),
        (114.5, 0, 20),
        (158, 5.5, 20),
        (196, 10.25, 20),
        (-80.5, 0, 0),
        (5, -5.5, 0),
        (90.5, 0, 0),
        (5, 5.5, 0),
        (43, 15, 20),
        (-80.5, 0, 20),
        (5, -5.5, 20),
        (90.5, 0, 20),
        (5, 5.5, 20),
        (-117.5, 0, 0),
        (-117.5, 0, 20),
        (-125, 0, 20),
        (43, -15, 20),
        (43, 15, 0),
        (196, 10.25, 0),
        (158, 5.5, 0),
        (114.5, 0, 0),
        (158, -5.5, 0),
        (196, -10.25, 0),
    ]]
    fillet(fillet1_edges, radius=FILLET1_R)


solid = part.part
